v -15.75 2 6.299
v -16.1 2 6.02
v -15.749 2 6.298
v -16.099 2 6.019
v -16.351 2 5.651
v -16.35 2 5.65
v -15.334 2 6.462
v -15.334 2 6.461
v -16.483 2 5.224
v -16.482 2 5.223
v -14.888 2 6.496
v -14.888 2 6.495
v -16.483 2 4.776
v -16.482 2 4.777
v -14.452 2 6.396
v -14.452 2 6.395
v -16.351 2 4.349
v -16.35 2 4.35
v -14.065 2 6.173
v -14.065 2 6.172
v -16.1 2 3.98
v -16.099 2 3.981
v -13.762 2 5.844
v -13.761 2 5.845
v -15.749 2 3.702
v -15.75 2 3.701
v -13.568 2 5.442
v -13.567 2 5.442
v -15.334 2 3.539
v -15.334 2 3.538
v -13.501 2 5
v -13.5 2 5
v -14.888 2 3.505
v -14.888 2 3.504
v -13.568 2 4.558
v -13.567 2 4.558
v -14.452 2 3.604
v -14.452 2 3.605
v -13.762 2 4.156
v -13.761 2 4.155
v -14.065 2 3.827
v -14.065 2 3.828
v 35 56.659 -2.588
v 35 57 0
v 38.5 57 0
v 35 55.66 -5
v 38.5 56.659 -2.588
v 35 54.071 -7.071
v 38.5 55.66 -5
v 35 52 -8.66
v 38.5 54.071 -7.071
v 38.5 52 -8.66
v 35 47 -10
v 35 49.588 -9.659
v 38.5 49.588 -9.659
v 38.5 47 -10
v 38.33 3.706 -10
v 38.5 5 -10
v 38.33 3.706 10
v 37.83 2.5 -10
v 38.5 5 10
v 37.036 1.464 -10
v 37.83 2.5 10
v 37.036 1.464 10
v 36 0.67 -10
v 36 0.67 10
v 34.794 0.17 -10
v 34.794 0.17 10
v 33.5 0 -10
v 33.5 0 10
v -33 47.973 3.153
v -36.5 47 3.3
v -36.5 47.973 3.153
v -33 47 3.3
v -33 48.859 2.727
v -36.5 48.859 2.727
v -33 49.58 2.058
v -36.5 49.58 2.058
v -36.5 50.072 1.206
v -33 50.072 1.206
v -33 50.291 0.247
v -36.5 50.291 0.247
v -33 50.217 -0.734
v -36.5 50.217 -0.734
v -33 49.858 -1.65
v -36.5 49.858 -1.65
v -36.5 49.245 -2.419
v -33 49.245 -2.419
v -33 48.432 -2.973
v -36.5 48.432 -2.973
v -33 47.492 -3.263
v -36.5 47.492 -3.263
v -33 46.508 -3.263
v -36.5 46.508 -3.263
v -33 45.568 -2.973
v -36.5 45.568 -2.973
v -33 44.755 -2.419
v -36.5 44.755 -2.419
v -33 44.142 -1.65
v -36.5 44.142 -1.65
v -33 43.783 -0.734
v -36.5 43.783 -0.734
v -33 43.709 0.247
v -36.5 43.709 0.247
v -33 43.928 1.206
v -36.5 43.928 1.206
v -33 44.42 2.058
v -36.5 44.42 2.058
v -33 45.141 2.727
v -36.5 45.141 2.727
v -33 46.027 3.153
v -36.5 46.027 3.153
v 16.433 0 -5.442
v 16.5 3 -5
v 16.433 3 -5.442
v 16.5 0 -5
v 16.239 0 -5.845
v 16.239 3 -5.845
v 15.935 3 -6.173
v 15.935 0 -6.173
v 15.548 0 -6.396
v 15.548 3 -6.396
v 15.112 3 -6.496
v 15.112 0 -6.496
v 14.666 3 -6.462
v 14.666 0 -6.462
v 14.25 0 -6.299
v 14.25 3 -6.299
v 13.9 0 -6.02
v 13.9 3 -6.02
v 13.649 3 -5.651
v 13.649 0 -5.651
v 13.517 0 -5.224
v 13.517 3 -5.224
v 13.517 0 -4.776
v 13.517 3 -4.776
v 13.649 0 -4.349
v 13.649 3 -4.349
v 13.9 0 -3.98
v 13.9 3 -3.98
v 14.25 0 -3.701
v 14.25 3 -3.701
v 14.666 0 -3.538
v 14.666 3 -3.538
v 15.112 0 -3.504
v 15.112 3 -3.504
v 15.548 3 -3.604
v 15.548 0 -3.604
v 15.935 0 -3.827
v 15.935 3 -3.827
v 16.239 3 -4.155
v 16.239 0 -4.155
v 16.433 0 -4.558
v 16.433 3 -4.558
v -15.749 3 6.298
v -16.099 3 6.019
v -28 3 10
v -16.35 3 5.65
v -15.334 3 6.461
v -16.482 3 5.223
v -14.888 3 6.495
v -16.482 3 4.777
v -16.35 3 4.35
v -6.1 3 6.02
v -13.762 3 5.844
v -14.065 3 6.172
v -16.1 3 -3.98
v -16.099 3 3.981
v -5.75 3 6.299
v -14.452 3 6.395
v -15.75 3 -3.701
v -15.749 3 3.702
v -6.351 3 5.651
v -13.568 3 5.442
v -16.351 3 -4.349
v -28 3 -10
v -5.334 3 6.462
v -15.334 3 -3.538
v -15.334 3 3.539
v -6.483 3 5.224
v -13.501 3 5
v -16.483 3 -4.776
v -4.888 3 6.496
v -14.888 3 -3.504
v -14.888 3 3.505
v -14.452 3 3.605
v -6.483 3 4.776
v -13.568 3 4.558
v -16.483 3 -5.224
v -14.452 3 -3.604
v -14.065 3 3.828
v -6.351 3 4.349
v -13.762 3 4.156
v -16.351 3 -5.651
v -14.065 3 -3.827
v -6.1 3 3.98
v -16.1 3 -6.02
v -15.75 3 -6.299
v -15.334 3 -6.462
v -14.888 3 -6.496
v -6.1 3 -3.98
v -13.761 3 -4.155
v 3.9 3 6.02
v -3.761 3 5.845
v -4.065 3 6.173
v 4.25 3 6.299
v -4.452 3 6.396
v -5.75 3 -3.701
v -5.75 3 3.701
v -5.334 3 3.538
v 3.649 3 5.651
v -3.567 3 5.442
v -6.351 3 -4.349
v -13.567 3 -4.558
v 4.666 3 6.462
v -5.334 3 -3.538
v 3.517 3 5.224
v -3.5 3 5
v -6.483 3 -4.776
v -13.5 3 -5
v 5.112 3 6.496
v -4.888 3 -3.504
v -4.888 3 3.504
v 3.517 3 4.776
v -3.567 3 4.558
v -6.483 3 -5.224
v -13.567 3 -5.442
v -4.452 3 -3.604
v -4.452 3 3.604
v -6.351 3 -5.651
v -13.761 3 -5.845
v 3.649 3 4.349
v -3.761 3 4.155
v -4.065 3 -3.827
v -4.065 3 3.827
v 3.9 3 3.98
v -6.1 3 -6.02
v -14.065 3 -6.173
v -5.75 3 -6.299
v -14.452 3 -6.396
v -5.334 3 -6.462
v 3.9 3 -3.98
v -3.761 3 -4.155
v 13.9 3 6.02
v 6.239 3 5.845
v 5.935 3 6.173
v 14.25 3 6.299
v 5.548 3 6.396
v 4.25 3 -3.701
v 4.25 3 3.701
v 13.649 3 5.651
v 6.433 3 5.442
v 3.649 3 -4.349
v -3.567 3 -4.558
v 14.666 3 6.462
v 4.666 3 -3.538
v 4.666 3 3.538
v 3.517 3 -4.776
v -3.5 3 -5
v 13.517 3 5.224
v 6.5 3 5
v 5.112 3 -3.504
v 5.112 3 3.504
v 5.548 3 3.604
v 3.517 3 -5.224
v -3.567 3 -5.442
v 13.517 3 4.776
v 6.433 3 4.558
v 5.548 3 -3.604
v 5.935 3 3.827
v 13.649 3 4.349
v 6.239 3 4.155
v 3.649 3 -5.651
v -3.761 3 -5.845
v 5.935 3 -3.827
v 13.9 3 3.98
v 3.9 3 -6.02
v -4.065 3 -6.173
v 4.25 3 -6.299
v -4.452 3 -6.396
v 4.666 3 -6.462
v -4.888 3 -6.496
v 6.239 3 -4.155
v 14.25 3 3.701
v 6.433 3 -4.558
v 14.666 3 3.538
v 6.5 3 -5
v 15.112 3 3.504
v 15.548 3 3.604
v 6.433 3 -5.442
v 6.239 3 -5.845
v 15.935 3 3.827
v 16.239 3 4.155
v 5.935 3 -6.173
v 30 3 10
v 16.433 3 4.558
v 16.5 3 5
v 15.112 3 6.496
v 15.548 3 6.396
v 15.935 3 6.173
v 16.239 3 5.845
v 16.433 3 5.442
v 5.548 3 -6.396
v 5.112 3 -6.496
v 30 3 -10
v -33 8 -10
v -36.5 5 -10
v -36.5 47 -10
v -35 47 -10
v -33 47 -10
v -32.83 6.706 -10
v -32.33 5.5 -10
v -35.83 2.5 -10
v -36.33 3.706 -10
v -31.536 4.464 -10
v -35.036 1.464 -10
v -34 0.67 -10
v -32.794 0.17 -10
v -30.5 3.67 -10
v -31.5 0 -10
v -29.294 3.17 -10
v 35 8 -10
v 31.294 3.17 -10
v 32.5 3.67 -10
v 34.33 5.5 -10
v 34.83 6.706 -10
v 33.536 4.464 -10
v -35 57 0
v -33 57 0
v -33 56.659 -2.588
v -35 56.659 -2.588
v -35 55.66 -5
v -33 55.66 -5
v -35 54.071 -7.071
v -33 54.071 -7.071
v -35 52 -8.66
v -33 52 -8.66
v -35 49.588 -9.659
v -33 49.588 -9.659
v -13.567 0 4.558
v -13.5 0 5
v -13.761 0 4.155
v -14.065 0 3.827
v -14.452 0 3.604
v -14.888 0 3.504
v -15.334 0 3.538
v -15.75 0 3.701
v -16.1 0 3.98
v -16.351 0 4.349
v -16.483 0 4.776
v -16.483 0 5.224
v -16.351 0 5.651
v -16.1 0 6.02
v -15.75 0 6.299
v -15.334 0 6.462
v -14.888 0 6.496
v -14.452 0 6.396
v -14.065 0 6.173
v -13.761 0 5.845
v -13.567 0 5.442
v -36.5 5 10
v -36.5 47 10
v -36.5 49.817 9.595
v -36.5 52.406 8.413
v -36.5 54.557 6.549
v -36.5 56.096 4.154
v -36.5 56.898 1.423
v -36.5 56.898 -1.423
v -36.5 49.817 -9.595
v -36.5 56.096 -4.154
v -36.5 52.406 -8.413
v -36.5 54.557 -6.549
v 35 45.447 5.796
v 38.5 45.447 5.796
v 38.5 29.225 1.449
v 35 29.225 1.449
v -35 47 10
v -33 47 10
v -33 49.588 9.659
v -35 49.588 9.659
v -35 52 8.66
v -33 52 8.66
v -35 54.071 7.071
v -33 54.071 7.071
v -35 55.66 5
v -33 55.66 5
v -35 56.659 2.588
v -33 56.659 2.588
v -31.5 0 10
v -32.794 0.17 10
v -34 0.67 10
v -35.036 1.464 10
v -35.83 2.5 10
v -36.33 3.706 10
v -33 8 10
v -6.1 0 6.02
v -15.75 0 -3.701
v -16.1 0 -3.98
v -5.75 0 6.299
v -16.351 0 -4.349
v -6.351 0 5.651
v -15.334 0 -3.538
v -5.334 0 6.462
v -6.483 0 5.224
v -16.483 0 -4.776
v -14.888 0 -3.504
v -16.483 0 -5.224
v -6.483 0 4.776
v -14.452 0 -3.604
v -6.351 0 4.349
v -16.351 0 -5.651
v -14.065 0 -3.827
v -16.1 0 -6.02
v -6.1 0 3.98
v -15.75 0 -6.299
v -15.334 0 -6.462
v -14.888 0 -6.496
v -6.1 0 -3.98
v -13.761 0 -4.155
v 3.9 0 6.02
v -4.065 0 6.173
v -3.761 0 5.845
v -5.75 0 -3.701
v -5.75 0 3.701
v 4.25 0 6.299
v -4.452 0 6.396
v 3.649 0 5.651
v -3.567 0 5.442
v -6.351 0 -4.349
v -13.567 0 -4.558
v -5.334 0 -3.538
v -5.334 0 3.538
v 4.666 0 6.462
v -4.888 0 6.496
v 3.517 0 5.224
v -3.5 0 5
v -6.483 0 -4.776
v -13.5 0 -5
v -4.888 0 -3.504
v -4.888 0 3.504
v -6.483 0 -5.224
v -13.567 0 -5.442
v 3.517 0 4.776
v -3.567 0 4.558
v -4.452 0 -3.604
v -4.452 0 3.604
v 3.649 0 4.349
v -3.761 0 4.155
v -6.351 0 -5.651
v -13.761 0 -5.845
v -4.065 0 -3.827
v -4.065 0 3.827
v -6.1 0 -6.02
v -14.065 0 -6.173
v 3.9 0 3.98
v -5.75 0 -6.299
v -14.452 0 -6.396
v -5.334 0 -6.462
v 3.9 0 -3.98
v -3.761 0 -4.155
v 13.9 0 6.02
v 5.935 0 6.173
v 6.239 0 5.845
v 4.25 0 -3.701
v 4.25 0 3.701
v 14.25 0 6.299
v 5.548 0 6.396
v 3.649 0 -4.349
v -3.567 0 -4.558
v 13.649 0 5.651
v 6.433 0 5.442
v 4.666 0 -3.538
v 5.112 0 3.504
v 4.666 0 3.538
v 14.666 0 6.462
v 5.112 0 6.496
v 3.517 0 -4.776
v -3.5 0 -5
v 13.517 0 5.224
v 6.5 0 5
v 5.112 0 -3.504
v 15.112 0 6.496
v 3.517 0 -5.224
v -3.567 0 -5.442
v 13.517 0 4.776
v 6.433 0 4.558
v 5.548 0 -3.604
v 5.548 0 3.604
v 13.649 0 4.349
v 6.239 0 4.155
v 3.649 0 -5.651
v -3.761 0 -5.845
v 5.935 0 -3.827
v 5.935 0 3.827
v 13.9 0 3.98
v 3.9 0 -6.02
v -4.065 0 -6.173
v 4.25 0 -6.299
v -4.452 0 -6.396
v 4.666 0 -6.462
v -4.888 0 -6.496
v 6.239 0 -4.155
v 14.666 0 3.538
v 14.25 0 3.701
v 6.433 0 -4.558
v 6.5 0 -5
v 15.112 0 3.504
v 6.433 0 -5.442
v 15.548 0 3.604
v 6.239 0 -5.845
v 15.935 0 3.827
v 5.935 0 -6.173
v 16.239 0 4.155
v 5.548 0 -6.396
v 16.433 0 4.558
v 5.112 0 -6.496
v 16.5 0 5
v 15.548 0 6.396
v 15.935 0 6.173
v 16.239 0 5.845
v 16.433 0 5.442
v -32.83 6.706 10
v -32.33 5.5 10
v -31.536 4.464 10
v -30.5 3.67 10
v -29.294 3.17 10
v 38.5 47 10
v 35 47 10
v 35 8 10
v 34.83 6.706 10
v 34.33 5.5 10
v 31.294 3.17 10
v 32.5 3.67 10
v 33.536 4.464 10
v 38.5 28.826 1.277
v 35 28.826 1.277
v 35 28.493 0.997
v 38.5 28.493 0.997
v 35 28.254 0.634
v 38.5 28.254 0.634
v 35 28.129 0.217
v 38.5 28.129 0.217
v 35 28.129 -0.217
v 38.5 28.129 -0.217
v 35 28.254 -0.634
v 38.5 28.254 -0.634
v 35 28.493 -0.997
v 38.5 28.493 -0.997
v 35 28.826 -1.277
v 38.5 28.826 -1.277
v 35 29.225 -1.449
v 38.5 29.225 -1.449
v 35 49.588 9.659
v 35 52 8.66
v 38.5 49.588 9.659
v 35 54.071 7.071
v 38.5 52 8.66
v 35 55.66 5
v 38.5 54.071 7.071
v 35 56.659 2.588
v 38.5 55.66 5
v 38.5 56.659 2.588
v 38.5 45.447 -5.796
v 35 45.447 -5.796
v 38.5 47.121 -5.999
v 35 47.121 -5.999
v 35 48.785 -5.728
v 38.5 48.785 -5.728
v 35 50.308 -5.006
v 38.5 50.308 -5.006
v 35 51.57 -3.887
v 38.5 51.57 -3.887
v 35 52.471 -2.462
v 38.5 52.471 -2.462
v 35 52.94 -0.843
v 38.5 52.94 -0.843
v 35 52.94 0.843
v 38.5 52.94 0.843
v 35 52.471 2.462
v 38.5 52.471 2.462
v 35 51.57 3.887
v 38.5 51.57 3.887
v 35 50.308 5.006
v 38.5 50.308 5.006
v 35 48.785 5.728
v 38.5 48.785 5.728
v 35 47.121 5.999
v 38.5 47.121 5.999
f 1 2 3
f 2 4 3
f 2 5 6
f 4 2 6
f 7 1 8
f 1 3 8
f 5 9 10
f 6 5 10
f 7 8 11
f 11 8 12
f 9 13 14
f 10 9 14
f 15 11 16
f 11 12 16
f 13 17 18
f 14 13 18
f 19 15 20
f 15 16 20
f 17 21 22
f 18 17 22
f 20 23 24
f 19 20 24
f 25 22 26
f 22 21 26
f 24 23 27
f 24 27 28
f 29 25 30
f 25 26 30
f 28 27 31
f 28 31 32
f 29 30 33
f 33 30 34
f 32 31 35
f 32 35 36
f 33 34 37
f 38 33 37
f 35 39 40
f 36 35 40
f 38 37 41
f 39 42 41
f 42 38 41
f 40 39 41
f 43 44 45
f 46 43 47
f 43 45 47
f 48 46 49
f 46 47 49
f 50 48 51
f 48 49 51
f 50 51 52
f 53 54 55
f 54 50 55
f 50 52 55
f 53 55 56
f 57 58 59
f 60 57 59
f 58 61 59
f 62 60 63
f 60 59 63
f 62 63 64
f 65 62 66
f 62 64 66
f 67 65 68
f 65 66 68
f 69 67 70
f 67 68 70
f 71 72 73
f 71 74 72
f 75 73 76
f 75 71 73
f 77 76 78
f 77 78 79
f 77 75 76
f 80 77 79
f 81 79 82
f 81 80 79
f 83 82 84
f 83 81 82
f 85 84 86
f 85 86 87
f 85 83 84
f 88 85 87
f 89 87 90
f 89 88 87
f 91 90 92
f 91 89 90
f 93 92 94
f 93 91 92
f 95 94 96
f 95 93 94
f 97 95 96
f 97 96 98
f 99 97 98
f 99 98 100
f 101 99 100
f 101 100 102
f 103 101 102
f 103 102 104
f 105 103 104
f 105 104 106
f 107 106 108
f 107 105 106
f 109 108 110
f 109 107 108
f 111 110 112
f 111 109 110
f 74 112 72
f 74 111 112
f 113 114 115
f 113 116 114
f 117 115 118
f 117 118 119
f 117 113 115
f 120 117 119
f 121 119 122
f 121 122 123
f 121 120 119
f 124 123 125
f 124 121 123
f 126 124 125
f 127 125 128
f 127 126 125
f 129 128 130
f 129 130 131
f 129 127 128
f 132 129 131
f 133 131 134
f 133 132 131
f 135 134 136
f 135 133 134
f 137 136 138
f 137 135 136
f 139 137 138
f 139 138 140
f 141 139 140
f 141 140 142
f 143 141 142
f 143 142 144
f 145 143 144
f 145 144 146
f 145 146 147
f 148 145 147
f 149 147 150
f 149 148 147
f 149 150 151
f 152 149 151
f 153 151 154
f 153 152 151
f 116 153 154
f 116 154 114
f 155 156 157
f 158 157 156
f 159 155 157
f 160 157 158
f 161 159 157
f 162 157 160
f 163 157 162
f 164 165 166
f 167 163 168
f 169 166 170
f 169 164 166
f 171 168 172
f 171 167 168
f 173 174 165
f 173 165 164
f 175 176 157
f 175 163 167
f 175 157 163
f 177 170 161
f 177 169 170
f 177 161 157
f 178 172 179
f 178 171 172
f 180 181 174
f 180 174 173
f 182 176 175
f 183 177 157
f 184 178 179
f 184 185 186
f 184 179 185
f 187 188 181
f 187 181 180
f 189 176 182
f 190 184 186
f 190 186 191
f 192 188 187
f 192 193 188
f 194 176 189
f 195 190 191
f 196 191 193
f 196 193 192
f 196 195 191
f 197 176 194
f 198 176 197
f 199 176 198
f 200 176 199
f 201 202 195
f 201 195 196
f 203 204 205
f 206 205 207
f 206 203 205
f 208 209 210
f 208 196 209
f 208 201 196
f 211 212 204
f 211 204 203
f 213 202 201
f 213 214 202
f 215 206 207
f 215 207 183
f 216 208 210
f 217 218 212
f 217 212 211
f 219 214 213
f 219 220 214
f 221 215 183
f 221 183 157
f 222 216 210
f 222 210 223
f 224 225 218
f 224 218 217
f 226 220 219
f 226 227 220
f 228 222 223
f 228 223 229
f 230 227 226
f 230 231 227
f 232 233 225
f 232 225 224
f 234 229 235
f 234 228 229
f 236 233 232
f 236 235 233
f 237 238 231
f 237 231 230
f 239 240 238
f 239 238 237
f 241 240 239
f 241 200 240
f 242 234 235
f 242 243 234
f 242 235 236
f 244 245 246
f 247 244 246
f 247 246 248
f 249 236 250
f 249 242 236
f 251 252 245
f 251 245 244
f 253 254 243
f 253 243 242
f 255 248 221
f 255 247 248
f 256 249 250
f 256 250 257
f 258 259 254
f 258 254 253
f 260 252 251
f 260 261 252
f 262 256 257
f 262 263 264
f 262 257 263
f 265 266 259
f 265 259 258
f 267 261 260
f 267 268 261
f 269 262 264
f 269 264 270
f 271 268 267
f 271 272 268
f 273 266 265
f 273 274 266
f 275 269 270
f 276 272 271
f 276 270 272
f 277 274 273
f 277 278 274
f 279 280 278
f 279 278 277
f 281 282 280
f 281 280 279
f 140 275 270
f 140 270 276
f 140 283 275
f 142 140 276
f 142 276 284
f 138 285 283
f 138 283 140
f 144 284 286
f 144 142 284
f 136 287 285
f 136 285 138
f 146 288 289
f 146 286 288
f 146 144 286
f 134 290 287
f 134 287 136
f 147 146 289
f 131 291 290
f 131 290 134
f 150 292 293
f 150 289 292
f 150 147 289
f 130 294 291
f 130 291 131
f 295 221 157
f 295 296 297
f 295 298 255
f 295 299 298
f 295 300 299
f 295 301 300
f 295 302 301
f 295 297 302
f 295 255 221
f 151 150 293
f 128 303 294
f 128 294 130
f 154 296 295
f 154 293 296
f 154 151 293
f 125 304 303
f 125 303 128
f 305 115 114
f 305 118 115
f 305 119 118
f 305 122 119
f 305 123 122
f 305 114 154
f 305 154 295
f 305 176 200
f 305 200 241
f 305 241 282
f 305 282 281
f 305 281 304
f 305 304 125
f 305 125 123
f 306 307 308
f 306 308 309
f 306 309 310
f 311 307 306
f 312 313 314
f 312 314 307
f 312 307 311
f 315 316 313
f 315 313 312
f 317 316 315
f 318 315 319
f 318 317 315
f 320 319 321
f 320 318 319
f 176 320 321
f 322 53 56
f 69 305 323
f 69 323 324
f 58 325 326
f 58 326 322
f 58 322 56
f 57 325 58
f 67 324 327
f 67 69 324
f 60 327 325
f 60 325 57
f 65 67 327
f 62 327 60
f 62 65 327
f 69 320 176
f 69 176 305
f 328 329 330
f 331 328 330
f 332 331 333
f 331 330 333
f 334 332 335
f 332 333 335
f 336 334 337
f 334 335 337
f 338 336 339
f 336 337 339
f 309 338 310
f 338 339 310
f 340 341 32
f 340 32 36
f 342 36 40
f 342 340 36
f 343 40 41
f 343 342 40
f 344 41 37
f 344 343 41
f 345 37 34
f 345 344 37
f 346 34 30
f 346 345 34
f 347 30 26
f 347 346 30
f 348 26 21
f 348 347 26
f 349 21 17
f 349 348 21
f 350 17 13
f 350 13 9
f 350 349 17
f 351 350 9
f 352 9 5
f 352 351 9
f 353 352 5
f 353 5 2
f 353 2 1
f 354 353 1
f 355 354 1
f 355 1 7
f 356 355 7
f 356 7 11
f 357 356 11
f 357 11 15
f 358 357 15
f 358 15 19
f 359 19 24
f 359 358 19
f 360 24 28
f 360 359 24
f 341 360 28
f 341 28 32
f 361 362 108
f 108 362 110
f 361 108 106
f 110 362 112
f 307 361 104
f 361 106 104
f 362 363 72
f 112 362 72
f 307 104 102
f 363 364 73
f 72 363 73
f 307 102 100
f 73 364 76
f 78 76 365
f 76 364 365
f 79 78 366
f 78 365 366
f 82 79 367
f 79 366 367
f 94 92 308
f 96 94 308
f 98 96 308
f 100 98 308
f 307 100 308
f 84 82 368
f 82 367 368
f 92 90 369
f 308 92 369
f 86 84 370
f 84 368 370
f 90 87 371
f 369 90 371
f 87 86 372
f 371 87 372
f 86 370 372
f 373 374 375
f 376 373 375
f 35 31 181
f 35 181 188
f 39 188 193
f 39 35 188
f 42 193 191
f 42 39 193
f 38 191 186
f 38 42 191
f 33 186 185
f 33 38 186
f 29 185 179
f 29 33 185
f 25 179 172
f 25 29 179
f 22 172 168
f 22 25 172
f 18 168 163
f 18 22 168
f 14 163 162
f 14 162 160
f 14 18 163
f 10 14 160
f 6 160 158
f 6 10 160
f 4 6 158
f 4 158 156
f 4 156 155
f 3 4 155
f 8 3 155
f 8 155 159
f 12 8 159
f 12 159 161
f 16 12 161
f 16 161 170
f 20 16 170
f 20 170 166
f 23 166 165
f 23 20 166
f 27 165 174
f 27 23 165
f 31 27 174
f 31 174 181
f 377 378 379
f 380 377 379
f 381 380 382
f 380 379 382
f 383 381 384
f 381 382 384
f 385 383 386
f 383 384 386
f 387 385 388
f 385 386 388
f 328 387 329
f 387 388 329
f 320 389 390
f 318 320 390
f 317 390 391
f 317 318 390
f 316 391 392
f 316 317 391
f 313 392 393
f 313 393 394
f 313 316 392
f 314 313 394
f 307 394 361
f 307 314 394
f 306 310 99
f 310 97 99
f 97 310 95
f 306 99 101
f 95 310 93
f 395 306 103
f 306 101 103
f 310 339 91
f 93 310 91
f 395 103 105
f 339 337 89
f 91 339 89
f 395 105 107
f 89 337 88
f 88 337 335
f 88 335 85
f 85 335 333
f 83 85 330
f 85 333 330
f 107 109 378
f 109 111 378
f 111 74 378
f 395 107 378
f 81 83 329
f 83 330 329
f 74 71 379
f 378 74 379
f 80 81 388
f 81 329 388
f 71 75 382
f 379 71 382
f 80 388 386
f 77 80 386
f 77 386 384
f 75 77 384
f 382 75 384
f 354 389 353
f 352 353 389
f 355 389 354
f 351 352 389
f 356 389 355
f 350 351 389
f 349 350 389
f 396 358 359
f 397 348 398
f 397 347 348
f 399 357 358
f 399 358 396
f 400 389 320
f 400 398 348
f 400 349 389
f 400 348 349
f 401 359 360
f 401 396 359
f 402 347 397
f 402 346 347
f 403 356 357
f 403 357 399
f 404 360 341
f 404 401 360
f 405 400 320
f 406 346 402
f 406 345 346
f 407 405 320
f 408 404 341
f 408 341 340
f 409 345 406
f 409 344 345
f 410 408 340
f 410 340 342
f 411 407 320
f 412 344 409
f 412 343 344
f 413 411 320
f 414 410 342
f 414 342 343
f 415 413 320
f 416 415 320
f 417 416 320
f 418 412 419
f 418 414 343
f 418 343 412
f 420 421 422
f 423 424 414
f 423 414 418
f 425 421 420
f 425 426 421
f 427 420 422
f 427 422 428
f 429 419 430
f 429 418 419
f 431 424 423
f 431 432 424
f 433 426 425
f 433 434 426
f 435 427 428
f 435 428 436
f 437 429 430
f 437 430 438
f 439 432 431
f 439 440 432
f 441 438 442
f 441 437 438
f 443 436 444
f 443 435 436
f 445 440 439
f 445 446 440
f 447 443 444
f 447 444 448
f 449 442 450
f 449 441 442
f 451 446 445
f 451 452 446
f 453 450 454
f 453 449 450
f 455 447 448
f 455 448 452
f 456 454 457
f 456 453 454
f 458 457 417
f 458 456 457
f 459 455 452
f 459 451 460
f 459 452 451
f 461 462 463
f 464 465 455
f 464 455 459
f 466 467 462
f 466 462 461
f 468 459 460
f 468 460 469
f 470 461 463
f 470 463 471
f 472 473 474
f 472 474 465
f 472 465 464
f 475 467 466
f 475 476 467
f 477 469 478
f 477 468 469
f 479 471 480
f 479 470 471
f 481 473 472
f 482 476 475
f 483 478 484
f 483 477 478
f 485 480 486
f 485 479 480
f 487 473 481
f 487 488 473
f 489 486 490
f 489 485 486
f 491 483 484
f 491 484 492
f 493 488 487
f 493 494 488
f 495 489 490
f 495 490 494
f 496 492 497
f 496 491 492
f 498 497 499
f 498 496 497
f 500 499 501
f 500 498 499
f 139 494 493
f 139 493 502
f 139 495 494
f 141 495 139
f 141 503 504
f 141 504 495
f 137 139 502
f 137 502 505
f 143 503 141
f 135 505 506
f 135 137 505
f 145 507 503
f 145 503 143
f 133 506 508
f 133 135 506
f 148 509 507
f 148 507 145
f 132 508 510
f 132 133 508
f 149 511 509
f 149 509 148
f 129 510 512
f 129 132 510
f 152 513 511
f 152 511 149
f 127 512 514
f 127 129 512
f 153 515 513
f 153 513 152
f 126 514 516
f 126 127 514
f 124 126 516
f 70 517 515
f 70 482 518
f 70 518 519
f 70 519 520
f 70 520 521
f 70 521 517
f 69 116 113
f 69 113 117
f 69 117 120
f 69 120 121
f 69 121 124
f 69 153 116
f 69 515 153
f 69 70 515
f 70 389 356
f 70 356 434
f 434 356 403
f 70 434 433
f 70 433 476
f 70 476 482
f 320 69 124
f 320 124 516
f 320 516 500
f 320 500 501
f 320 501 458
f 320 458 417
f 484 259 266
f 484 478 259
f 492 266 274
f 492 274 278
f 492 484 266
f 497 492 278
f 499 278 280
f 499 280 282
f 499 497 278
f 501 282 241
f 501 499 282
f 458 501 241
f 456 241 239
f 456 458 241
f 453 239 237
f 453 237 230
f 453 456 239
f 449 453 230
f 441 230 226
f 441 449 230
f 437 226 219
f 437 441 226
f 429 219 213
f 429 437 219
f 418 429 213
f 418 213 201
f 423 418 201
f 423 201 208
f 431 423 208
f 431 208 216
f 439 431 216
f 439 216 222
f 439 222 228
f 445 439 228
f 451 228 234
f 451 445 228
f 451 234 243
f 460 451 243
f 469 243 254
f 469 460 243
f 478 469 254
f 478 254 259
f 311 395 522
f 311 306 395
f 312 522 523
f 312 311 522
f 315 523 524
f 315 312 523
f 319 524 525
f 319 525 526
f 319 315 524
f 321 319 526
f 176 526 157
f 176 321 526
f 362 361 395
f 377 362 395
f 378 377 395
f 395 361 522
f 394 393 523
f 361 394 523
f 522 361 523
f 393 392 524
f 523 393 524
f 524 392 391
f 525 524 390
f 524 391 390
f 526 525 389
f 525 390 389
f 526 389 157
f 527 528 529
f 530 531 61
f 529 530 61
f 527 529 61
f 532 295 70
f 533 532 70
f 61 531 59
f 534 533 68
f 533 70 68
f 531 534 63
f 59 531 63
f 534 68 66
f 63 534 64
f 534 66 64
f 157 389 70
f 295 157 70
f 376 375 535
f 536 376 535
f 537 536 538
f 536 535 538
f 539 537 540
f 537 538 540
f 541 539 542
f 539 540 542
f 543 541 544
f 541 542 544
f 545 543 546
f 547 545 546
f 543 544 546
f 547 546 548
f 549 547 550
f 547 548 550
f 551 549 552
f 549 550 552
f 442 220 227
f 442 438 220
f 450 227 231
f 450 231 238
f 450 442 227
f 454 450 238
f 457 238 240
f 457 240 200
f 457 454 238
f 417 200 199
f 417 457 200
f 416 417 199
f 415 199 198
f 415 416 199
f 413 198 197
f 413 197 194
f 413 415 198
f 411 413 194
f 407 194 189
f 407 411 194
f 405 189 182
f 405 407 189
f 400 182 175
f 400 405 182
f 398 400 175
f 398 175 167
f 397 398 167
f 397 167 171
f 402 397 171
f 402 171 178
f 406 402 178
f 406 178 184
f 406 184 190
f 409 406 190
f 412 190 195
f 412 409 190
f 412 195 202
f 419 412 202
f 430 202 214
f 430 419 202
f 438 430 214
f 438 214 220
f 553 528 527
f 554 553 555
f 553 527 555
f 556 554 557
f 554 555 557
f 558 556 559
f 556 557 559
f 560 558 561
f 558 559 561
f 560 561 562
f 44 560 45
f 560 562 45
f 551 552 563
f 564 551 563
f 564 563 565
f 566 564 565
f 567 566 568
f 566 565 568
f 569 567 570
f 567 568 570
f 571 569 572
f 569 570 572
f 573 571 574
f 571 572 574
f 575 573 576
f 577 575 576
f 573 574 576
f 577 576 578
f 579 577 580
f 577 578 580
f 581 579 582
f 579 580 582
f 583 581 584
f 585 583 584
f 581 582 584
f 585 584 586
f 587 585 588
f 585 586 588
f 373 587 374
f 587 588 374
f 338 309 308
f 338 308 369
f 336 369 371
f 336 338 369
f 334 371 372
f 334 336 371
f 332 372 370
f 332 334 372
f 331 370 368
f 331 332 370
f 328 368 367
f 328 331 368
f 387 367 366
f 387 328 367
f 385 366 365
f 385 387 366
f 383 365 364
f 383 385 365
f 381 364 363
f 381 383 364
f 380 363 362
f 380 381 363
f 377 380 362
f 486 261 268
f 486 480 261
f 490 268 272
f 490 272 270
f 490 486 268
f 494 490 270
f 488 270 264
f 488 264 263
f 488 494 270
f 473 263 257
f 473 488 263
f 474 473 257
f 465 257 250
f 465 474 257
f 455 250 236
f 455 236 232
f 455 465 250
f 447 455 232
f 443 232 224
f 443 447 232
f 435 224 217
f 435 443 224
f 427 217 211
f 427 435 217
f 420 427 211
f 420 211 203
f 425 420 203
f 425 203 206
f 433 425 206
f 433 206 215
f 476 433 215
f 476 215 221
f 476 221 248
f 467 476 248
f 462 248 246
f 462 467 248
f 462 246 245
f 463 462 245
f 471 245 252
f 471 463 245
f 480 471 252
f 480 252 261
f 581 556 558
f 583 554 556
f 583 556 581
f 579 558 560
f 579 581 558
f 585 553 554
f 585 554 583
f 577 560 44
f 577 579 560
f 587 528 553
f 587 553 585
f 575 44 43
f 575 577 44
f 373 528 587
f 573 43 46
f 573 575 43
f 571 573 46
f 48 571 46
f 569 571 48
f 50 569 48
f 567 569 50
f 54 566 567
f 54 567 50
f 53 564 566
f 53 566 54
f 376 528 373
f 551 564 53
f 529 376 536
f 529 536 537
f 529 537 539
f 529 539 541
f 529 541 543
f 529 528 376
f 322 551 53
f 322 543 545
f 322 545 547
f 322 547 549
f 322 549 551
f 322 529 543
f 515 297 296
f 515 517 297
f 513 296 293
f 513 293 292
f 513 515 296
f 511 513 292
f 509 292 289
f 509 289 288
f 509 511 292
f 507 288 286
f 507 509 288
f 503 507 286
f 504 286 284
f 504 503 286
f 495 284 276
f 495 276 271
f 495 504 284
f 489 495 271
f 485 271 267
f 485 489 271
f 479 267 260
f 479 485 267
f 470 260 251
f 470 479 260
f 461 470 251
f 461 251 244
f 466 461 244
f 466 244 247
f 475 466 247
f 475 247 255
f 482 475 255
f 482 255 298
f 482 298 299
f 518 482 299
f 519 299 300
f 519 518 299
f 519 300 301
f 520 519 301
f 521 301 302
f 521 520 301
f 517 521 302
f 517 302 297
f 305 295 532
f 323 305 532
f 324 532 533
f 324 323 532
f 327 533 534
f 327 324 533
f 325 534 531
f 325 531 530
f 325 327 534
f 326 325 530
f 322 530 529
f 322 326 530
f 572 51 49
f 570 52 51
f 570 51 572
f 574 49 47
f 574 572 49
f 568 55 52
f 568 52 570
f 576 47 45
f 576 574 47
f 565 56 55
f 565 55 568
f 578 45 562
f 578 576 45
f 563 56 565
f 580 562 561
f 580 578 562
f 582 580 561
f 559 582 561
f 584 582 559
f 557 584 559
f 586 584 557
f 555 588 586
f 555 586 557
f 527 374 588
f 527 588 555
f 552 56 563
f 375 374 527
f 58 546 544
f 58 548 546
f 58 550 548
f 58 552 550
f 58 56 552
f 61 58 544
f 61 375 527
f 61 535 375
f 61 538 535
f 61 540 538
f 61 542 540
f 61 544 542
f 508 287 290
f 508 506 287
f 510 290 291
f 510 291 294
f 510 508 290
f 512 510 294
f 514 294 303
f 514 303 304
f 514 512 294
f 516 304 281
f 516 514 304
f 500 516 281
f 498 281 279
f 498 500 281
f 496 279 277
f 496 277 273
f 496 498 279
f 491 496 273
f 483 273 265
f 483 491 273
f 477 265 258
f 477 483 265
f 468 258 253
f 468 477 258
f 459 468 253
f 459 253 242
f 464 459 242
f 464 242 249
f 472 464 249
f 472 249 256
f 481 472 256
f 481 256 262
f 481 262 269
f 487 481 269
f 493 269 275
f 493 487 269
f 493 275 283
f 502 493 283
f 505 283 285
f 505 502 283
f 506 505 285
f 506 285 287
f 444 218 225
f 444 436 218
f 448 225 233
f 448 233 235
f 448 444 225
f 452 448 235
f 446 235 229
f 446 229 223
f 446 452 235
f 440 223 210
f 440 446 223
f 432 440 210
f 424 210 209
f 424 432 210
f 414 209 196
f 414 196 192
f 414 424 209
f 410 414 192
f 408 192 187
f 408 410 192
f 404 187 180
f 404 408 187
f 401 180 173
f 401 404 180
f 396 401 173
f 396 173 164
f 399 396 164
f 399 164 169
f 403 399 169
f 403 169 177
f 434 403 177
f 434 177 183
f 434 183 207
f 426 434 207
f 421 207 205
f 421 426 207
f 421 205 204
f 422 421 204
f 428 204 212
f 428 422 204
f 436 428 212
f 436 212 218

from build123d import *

# Parameters (mm, degrees)
SKETCH_2_R          = 1.5
EXTRUDE_1_DEPTH     = 2
SKETCH_3_W          = 2
SKETCH_3_H          = 20
SKETCH_3_W_2        = 3.5
EXTRUDE_2_DEPTH     = 55
SKETCH_9_R          = 6
CUT_EXTRUDE_1_DEPTH = 87
SKETCH_7_R          = 6
SKETCH_7_R_2        = 3.3
EXTRUDE_3_DEPTH     = 2
SKETCH_10_R         = 3.3
EXTRUDE_4_DEPTH     = 1.5
SKETCH_11_W         = 68
SKETCH_11_H         = 20
SKETCH_11_R         = 1.5
SKETCH_11_R_2       = 1.498871695
EXTRUDE_5_DEPTH     = 1
FILLET_6_R          = 5
FILLET_7_R          = 5
FILLET_8_R          = 5
CUT_EXTRUDE_2_DEPTH = 3.5


with BuildPart() as part:
    # 스케치2 → 보스-돌출1 (new body)
    with BuildSketch(Plane(origin=(0, 0, 0), x_dir=(1, 0, 0), z_dir=(0, 1, 0))):
        Polygon((35, -10), (-35, -10), (-35, 10), (35, 10), (38.5, 10), (38.5, -10), align=None)
        with Locations((-15, 5)):
            Circle(SKETCH_2_R, mode=Mode.SUBTRACT)
        with Locations((-5, 5)):
            Circle(SKETCH_2_R, mode=Mode.SUBTRACT)
        with Locations((-15, -5)):
            Circle(SKETCH_2_R, mode=Mode.SUBTRACT)
        with Locations((-5, -5)):
            Circle(SKETCH_2_R, mode=Mode.SUBTRACT)
        with Locations((15, -5)):
            Circle(SKETCH_2_R, mode=Mode.SUBTRACT)
        with Locations((5, -5)):
            Circle(SKETCH_2_R, mode=Mode.SUBTRACT)
        with Locations((5, 5)):
            Circle(SKETCH_2_R, mode=Mode.SUBTRACT)
        with Locations((15, 5)):
            Circle(SKETCH_2_R, mode=Mode.SUBTRACT)
    extrude(amount=EXTRUDE_1_DEPTH)

    # 스케치3 → 보스-돌출2 (add)
    with BuildSketch(Plane(origin=(0, 2, 0), x_dir=(1, 0, 0), z_dir=(0, 1, 0))):
        with Locations((-34, 0)):
            Rectangle(SKETCH_3_W, SKETCH_3_H)
        with Locations((36.75, 0)):
            Rectangle(SKETCH_3_W_2, SKETCH_3_H)
    extrude(amount=EXTRUDE_2_DEPTH)

    # 스케치9 → 컷-돌출1 (cut)
    with BuildSketch(Plane(origin=(38.5, 0, 0), x_dir=(0, 0, -1), z_dir=(1, 0, 0))):
        with BuildLine():
            Line((10, 57), (0, 57))
            ThreePointArc((0, 57), (7.071067812, 54.071067812), (10, 47))
            Line((10, 47), (10, 57))
        make_face()
        with BuildLine():
            Line((-10, 57), (-10, 47))
            ThreePointArc((-10, 47), (-7.071067812, 54.071067812), (0, 57))
            Line((0, 57), (-10, 57))
        make_face()
        with Locations((0, 47)):
            Circle(SKETCH_9_R)
    extrude(amount=-CUT_EXTRUDE_1_DEPTH, mode=Mode.SUBTRACT)

    # 스케치7 → 보스-돌출3 (add)
    with BuildSketch(Plane.ZY.offset(35)):
        with Locations((0, 47)):
            Circle(SKETCH_7_R)
        with Locations((0, 47)):
            Circle(SKETCH_7_R_2, mode=Mode.SUBTRACT)
    extrude(amount=-EXTRUDE_3_DEPTH)

    # 스케치10 → 보스-돌출4 (add)
    with BuildSketch(Plane.ZY.offset(35)):
        with BuildLine():
            ThreePointArc((-10, 47), (0, 57), (10, 47))
            Line((10, 47), (10, 0))
            Line((10, 0), (-10, 0))
            Line((-10, 0), (-10, 47))
        make_face()
        with Locations((0, 47)):
            Circle(SKETCH_10_R, mode=Mode.SUBTRACT)
    extrude(amount=EXTRUDE_4_DEPTH)

    # 스케치11 → 보스-돌출5 (add)
    with BuildSketch(Plane(origin=(0, 2, 0), x_dir=(1, 0, 0), z_dir=(0, 1, 0))):
        with Locations((1, 0)):
            Rectangle(SKETCH_11_W, SKETCH_11_H)
        with Locations((-15, 5)):
            Circle(SKETCH_11_R, mode=Mode.SUBTRACT)
        with Locations((-5, 5)):
            Circle(SKETCH_11_R, mode=Mode.SUBTRACT)
        with Locations((5, 5)):
            Circle(SKETCH_11_R, mode=Mode.SUBTRACT)
        with Locations((15, 5)):
            Circle(SKETCH_11_R, mode=Mode.SUBTRACT)
        with Locations((15, -5)):
            Circle(SKETCH_11_R, mode=Mode.SUBTRACT)
        with Locations((5, -5)):
            Circle(SKETCH_11_R, mode=Mode.SUBTRACT)
        with Locations((-5, -5)):
            Circle(SKETCH_11_R, mode=Mode.SUBTRACT)
        with Locations((-15, -5)):
            Circle(SKETCH_11_R_2, mode=Mode.SUBTRACT)
    extrude(amount=EXTRUDE_5_DEPTH)

    # 필렛6
    fillet_6_edges = [part.edges().sort_by_distance(p)[0] for p in [
        (-33, 3, 0),
    ]]
    fillet(fillet_6_edges, radius=FILLET_6_R)

    # 필렛7
    fillet_7_edges = [part.edges().sort_by_distance(p)[0] for p in [
        (35, 3, 0),
    ]]
    fillet(fillet_7_edges, radius=FILLET_7_R)

    # 필렛8
    fillet_8_edges = [part.edges().sort_by_distance(p)[0] for p in [
        (-36.5, 0, 0),
        (38.5, 0, 0),
    ]]
    fillet(fillet_8_edges, radius=FILLET_8_R)

    # 스케치12 → 컷-돌출2 (cut)
    with BuildSketch(Plane(origin=(38.5, 0, 0), x_dir=(0, 0, -1), z_dir=(1, 0, 0))):
        with BuildLine():
            ThreePointArc((-1.448888739, 29.225106559), (0, 28.113335127), (1.448888739, 29.225106559))
            Line((1.448888739, 29.225106559), (5.795554958, 45.447085729))
            ThreePointArc((5.795554958, 45.447085729), (0, 41), (-5.795554958, 45.447085729))
            Line((-5.795554958, 45.447085729), (-1.448888739, 29.225106559))
        make_face()
    extrude(amount=-CUT_EXTRUDE_2_DEPTH, mode=Mode.SUBTRACT)


solid = part.part
